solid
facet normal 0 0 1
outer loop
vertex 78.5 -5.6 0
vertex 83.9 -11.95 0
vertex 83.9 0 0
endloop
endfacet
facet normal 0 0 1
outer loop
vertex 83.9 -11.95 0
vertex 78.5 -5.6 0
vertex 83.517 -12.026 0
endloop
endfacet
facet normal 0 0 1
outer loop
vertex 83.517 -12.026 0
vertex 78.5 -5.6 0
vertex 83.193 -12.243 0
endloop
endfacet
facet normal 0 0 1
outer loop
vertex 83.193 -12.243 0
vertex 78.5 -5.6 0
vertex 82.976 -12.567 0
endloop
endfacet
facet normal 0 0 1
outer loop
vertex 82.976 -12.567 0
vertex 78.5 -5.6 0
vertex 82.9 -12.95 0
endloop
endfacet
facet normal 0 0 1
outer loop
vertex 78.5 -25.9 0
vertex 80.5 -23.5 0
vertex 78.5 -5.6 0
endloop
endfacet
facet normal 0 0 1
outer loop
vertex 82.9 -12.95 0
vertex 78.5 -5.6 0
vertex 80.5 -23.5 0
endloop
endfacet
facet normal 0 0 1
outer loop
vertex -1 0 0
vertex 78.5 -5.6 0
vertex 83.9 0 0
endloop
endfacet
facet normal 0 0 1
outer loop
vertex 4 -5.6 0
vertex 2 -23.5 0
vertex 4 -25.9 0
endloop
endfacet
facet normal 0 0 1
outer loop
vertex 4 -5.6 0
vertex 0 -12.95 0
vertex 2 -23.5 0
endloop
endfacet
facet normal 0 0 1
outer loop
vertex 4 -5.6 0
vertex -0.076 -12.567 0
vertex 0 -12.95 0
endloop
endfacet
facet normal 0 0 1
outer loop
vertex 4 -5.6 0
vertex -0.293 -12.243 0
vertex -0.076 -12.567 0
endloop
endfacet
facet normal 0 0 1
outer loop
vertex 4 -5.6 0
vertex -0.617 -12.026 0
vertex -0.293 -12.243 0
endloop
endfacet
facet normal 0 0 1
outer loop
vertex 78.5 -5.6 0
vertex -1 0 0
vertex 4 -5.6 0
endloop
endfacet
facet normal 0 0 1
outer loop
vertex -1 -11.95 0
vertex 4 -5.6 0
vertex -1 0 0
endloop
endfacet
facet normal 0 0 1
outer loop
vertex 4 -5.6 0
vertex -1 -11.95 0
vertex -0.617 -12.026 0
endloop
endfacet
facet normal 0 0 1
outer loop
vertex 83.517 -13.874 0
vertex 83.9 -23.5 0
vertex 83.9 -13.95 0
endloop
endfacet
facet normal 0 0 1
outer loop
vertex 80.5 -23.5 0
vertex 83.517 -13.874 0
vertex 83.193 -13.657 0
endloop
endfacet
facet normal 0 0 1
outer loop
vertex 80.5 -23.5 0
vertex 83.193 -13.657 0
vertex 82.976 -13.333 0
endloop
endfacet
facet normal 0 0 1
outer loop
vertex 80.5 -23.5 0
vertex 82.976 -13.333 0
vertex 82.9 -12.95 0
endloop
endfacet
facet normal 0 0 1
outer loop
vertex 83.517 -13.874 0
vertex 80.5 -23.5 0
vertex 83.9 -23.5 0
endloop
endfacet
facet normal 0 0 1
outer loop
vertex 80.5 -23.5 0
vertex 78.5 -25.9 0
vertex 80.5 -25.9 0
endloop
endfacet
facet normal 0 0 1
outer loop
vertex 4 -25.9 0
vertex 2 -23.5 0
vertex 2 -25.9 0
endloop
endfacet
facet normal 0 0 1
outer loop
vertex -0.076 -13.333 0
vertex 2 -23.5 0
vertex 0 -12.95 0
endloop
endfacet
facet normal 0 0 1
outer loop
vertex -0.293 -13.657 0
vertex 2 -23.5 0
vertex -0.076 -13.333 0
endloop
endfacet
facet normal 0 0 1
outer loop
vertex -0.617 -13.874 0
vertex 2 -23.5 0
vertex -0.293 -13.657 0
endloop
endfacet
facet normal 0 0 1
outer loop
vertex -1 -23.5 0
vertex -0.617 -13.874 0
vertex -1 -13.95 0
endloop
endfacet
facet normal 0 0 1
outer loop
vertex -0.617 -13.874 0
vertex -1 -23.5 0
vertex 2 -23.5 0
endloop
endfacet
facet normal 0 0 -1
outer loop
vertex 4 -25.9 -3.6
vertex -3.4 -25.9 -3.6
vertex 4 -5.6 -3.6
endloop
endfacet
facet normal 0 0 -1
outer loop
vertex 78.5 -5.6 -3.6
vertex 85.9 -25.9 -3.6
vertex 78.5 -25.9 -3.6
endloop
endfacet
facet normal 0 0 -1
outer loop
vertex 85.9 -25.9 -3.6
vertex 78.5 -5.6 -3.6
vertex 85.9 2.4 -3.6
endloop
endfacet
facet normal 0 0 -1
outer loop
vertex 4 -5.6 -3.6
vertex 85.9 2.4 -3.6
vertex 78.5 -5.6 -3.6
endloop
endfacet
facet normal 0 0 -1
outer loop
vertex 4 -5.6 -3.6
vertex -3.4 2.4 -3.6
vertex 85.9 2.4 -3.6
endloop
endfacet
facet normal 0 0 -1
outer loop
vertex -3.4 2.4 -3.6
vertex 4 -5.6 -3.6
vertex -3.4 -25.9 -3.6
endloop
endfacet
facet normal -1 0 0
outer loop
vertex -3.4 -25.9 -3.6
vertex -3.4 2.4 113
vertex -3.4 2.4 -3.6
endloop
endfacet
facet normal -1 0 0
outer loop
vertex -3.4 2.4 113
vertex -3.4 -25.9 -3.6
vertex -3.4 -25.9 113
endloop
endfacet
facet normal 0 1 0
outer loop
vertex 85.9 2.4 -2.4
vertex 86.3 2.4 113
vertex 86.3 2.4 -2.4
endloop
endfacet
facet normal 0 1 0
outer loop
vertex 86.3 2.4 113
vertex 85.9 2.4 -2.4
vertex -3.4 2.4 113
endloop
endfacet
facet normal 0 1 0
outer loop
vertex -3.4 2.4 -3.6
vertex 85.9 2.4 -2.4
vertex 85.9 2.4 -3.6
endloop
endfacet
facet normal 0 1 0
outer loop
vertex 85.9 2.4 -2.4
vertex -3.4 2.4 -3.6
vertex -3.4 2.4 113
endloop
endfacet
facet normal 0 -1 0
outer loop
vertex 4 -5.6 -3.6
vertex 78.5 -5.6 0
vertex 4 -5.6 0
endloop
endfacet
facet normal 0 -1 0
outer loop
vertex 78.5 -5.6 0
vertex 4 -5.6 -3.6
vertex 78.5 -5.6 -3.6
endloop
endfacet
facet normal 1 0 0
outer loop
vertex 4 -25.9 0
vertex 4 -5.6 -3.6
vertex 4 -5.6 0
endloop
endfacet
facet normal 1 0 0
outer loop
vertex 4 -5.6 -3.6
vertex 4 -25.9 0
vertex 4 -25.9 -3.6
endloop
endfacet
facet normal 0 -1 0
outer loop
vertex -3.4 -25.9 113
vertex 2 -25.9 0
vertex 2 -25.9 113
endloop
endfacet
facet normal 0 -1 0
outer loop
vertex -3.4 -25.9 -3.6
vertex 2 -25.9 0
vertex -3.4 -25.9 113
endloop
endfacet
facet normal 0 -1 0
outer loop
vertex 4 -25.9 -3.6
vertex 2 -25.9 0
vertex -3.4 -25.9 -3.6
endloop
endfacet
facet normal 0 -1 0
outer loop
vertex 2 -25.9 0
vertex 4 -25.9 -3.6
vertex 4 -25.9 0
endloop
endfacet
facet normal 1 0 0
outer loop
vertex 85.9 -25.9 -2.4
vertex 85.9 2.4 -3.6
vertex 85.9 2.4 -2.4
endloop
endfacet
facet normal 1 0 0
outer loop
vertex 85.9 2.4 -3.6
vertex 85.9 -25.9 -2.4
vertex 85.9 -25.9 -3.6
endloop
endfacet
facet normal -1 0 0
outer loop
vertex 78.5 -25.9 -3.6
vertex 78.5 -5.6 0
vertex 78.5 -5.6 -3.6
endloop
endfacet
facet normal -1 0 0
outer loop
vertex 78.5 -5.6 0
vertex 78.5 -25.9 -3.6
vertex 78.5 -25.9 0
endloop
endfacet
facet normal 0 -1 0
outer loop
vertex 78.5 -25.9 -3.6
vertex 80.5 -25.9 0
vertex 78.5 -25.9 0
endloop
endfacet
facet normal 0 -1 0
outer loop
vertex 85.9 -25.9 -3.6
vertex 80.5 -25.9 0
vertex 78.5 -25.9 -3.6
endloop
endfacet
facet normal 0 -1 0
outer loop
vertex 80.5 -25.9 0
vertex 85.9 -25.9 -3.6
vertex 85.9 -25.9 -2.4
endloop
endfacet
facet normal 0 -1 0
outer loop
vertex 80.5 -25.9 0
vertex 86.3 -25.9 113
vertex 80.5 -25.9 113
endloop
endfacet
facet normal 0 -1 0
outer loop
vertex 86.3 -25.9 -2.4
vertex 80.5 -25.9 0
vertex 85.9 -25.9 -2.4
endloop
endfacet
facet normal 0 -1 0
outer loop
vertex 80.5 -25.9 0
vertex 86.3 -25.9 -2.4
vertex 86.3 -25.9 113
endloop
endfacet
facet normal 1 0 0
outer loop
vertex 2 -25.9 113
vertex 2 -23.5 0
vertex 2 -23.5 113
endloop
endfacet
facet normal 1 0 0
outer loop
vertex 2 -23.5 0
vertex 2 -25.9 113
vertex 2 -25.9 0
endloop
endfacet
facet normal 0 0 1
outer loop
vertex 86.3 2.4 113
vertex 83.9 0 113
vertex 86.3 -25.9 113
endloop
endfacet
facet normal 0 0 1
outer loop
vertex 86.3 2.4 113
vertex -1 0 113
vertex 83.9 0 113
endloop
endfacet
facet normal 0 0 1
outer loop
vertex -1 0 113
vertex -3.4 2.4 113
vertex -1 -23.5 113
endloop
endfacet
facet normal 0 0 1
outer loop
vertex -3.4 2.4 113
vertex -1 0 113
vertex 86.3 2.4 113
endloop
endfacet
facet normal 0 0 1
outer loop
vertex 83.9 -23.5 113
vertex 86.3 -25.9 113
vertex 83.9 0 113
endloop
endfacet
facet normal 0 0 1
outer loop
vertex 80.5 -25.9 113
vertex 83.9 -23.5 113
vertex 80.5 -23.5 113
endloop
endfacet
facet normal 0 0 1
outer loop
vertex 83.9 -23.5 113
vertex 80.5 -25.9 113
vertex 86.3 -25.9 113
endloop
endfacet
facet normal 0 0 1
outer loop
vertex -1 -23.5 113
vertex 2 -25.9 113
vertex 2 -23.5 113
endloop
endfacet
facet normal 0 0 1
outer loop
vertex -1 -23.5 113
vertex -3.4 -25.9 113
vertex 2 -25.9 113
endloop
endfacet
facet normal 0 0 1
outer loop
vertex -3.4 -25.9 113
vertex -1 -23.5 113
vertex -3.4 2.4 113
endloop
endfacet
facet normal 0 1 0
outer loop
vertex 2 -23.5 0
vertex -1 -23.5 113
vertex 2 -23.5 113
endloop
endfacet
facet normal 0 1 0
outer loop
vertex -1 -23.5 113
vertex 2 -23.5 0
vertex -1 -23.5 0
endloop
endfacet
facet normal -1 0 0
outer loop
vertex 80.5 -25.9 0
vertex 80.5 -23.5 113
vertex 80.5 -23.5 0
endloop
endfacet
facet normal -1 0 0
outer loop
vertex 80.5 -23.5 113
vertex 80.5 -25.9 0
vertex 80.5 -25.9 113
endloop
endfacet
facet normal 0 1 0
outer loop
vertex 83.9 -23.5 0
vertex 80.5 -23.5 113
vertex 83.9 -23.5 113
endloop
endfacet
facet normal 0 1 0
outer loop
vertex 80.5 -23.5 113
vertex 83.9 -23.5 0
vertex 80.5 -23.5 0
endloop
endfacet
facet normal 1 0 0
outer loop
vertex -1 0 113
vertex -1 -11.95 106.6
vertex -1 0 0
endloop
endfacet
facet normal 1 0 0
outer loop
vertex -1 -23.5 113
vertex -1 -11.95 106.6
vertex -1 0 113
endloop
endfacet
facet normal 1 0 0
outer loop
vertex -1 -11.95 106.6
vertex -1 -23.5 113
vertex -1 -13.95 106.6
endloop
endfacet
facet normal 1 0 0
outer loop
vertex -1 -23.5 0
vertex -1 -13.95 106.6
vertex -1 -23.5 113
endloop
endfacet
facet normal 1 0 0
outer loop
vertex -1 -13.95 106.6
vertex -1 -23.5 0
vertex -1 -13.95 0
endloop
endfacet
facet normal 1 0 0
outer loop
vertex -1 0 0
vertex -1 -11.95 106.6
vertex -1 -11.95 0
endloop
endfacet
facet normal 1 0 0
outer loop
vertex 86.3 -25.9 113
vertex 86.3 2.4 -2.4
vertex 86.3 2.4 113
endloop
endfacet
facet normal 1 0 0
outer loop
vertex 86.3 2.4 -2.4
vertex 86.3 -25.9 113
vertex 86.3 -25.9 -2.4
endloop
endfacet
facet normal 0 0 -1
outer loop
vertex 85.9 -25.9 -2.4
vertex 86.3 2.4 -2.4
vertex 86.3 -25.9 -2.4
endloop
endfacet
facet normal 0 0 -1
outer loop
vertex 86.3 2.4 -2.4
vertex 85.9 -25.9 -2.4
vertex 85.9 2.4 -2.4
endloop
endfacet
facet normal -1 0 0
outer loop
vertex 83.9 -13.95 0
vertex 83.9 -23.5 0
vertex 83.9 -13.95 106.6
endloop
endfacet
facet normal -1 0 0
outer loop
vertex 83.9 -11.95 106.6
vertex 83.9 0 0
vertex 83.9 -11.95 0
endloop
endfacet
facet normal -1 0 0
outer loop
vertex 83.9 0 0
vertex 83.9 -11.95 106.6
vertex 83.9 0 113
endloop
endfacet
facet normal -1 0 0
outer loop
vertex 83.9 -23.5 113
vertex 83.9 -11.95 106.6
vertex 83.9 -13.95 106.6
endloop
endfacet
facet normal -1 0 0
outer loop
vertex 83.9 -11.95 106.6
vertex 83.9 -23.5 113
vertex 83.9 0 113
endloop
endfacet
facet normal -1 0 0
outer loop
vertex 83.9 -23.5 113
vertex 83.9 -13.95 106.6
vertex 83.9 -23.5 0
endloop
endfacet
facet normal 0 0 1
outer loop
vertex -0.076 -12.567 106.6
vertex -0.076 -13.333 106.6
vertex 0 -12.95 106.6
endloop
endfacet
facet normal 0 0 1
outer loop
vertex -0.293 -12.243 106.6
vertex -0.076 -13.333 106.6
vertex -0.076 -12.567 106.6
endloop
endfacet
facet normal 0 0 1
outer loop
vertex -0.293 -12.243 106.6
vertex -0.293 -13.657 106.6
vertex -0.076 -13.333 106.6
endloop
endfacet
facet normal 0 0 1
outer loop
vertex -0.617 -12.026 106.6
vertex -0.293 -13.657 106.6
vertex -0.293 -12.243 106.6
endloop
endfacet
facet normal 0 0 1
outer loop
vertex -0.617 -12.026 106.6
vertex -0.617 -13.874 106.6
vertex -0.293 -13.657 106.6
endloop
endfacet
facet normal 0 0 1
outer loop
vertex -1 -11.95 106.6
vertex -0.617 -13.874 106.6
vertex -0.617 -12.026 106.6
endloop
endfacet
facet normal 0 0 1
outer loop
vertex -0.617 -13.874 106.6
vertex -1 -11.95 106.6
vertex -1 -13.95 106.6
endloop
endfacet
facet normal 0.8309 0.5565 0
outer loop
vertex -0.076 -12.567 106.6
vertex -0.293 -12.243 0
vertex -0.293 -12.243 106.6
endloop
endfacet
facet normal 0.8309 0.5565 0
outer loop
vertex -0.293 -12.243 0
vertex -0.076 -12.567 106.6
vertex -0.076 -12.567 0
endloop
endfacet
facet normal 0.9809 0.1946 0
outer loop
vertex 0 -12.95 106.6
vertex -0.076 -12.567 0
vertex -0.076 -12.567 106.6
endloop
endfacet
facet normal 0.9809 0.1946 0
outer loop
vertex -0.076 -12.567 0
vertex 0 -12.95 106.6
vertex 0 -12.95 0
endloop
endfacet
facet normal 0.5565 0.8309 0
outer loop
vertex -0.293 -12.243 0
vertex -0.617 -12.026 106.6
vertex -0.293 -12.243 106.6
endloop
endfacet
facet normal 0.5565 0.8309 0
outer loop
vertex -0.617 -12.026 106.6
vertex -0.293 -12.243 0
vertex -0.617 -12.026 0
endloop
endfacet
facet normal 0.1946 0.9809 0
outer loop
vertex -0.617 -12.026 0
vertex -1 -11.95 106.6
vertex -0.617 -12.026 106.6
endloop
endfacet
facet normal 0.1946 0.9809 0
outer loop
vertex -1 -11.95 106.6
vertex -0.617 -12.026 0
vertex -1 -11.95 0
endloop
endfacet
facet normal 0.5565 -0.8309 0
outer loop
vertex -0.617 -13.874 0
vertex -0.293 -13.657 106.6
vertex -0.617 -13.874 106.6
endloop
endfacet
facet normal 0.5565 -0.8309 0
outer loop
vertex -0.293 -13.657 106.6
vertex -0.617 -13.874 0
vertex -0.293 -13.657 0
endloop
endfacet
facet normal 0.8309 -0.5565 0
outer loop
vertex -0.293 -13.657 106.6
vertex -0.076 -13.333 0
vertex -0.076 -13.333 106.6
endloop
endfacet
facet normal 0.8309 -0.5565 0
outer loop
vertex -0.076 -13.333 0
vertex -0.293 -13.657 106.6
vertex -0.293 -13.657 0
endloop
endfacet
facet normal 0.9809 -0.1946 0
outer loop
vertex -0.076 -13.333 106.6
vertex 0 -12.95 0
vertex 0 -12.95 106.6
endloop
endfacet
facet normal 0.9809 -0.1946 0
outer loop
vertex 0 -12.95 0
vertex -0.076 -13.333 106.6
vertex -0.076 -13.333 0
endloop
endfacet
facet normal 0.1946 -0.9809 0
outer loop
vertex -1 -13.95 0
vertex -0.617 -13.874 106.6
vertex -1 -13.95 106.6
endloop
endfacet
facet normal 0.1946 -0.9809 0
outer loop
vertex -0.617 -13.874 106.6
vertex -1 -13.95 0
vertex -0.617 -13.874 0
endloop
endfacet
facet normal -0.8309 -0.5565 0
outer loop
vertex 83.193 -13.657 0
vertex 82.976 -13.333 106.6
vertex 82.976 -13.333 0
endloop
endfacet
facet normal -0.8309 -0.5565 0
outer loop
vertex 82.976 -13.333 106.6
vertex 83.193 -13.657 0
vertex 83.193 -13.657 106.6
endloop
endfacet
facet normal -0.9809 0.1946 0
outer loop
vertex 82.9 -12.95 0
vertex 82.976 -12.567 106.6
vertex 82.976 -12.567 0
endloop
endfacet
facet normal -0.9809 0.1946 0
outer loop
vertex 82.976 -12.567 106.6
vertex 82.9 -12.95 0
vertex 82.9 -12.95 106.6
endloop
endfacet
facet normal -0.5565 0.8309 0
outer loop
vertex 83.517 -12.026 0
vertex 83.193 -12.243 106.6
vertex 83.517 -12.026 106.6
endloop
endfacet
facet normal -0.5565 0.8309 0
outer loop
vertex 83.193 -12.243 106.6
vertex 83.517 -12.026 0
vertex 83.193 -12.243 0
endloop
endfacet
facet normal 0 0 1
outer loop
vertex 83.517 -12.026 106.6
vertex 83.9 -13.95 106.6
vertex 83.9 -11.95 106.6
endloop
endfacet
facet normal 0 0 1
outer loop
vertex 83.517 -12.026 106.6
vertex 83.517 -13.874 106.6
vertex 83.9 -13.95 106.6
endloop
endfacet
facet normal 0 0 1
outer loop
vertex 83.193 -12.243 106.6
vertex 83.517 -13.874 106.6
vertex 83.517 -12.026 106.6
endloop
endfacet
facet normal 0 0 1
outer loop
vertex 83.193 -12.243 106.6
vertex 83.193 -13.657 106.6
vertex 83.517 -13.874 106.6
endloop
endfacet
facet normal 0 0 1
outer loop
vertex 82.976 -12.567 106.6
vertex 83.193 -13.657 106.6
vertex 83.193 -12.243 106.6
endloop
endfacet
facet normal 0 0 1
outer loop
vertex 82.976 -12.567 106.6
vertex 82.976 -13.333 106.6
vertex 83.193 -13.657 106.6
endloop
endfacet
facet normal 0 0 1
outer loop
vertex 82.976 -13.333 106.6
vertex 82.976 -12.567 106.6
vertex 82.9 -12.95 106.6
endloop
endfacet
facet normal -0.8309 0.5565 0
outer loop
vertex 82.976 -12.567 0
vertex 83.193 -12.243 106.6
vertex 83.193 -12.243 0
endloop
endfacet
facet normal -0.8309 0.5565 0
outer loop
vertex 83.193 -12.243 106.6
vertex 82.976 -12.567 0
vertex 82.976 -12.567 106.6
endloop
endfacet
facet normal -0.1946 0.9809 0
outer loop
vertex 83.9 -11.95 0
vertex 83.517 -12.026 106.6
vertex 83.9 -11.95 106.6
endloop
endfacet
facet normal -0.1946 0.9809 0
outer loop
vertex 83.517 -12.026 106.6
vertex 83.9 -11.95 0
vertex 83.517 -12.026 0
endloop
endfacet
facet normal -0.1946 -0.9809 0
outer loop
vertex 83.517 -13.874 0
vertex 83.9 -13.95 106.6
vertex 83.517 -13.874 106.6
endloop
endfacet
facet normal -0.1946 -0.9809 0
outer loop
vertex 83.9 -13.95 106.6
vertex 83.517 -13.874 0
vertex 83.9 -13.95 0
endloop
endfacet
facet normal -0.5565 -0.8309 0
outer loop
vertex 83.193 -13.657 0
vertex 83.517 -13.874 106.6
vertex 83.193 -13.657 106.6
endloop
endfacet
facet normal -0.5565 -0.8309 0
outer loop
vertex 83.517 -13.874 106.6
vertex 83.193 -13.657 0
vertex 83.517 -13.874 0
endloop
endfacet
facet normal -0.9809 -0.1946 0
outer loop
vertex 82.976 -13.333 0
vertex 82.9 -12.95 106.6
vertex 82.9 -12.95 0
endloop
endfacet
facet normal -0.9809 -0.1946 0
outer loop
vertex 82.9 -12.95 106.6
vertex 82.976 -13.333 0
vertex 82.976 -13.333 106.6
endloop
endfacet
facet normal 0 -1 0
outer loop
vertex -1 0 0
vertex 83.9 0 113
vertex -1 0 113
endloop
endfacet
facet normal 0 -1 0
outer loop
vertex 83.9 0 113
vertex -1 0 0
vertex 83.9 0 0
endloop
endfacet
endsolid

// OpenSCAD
// Wall mount for CMKY -> HMDI converter
//
// Box dimensions 4 1/2 by 3 1/2 by 1"

$fa = 8; $fs = 0.4;
eps = .001;

length = 82.5;  // 3.50 * 25.4;
height = 109.0; // 4.50 * 25.4;
depth = 22.5; // 1.00 * 25.4;


// The object (for reference
// translate([0, -depth, 0]) color("blue") cube([length, depth, height]);


// bottom lip
module bottom_lip () {
    // Long bar
    translate([-3.4, -5.6, -3.6]) cube([length + 3 + 3, 8, 3.6]);
    // Left
    translate([-3.4,         -depth - 3.4, -3.6]) cube([7.4, depth + 5.8, 3.6]);
    // Right
    translate([length - 4, -depth - 3.4, -3.6]) cube([7.4, depth + 5.8, 3.6]);
}

//Front lip
module front_lip () {
    // left
    translate([-3, -depth - 3.4, -2]) cube([5, 2.4, height + 6]);
    // right
    translate([length - 2, -depth - 3.4, -2]) cube([5.4, 2.4, height + 6]);
}


module back () {
    translate([-3, 0, -2.8]) cube([length + 6, 2.4, height + 6.8]);

}

module sides () {
    translate([-3.4,         -depth - 3.4, -2.4]) cube([2.4, depth + 5.8, height + 6.4]);
    translate([length + 1.4, -depth - 3.4, -2.4]) cube([2.4, depth + 5.8, height + 6.4]);
}

module nubs () {
    translate([-1, (-depth - 3.4)/2, -2.4]) cylinder(r=1, h=height);
    translate([length + 1.4, (-depth - 3.4)/2, -2.4]) cylinder(r=1, h=height);
}

//main
bottom_lip();
front_lip();
back();
sides();
nubs();


/*
Second design changes

Solid frame instead of one cut-out
expand face screw holes from 2.5 to 3.5
expand face screw holes from 2.5 to 3.5
Created air holes at the bottom of the large top openings to avoid vacuum
*/


// translate([20, 0, 20]) color([1,0,0]) cube([.8, .8, .8]);

//module case2 () {
//    union () {
//        color("red") cube([76, 15, 50]); // The main cube
//        // Widest section
//        translate([20, -4, 0]) cube([36, 4, 28]);
//        // github
//        rotate(a=[90]) {
//            translate([22, 20, 2]) { color([0, 0, 1.0]) {
//                linear_extrude(height=3.5) text("github/",
//                     font = "Liberation Sans:style=Bold",
//                     size = 7);
//            }
//            }
//            translate([22, 11, 2]) { color([0, 0, 1.0]) {
//                linear_extrude(height=4) text("robert",
//                     font = "Liberation Sans:style=Bold",
//                     size = 7);
//            }
//            }
//            translate([22, 3, 2]) { color([0, 0, 1.0]) {
//                linear_extrude(height=4) text("lugg",
//                     font = "Liberation Sans:style=Bold",
//                     size = 7);
//            }
//            }
//        }
//    }
//}
//
//
//module front_screw_hole () {
//    union () {
//        rotate(a=[-90, 0, 0]) cylinder(13.5+8+3*eps, d=3.5, center=false);
//        rotate(a=[-90, 0, 0]) cylinder(2+2*eps, d1=7.0, d2=3.5, center=false);
//    }
//}
//
//module top_screw_hole () {
//    union () {
//        translate([0, 0, 0-eps]) cylinder(50+2*eps, d=3.5, center=false);
//        translate([0, 0, 48]) cylinder(2+eps, d1=3.5, d2=7, center=false);
//    }
//}
//
//rotate ([-90, 0, 0]) {
//translate ([0, -15,0]) {
//    difference() {
//        case2();
//        // Thickness (Y) of block is 15 in center but 13.5 on edges
//        translate([-eps, -eps, -eps]) cube([20+2*eps, 1.5+2*eps, 50+2*eps]);
//        translate([56-eps, 0-eps, 0-eps]) cube([20+2*eps, 1.5+2*eps, 50+2*eps]);
//        
//        // Top screw holes
//        // The 6.5, 38, and 69.5 are required.  The others
//        // would hold an additional screw
//        //left
//        translate([6.5, 7.5, 0]) top_screw_hole();
//        // extra left
//        translate([6.5+17, 7.5, 0]) top_screw_hole();
//        //center
//        translate([38, 7.5, 0]) top_screw_hole();
//        //right
//        translate([69.5, 7.5, 0]) top_screw_hole();
//        // extra right
//        translate([69.5-17, 7.5, 0]) top_screw_hole();
//        
//        // Front screw holes
//        // Two forward-facing screw openings
//        translate([12+0.5, 1.5-eps, 25]) front_screw_hole();
//        translate([64-0.5, 1.5-eps, 25]) front_screw_hole();
//        // Two additional forward-facing edge screw openings
//        // Would require drilling into metal
//        translate([12+0.5, 1.5-eps, 10]) front_screw_hole();
//        translate([64-0.6, 1.5-eps, 10]) front_screw_hole();
//        // Two additional forward-facing top screw openings
//        // Would require drilling into metal
//        translate([38-8.5, 0-eps, 43]) front_screw_hole();
//        translate([38+8.5, 0-eps, 43]) front_screw_hole();
//        
//    }
//}
//}
